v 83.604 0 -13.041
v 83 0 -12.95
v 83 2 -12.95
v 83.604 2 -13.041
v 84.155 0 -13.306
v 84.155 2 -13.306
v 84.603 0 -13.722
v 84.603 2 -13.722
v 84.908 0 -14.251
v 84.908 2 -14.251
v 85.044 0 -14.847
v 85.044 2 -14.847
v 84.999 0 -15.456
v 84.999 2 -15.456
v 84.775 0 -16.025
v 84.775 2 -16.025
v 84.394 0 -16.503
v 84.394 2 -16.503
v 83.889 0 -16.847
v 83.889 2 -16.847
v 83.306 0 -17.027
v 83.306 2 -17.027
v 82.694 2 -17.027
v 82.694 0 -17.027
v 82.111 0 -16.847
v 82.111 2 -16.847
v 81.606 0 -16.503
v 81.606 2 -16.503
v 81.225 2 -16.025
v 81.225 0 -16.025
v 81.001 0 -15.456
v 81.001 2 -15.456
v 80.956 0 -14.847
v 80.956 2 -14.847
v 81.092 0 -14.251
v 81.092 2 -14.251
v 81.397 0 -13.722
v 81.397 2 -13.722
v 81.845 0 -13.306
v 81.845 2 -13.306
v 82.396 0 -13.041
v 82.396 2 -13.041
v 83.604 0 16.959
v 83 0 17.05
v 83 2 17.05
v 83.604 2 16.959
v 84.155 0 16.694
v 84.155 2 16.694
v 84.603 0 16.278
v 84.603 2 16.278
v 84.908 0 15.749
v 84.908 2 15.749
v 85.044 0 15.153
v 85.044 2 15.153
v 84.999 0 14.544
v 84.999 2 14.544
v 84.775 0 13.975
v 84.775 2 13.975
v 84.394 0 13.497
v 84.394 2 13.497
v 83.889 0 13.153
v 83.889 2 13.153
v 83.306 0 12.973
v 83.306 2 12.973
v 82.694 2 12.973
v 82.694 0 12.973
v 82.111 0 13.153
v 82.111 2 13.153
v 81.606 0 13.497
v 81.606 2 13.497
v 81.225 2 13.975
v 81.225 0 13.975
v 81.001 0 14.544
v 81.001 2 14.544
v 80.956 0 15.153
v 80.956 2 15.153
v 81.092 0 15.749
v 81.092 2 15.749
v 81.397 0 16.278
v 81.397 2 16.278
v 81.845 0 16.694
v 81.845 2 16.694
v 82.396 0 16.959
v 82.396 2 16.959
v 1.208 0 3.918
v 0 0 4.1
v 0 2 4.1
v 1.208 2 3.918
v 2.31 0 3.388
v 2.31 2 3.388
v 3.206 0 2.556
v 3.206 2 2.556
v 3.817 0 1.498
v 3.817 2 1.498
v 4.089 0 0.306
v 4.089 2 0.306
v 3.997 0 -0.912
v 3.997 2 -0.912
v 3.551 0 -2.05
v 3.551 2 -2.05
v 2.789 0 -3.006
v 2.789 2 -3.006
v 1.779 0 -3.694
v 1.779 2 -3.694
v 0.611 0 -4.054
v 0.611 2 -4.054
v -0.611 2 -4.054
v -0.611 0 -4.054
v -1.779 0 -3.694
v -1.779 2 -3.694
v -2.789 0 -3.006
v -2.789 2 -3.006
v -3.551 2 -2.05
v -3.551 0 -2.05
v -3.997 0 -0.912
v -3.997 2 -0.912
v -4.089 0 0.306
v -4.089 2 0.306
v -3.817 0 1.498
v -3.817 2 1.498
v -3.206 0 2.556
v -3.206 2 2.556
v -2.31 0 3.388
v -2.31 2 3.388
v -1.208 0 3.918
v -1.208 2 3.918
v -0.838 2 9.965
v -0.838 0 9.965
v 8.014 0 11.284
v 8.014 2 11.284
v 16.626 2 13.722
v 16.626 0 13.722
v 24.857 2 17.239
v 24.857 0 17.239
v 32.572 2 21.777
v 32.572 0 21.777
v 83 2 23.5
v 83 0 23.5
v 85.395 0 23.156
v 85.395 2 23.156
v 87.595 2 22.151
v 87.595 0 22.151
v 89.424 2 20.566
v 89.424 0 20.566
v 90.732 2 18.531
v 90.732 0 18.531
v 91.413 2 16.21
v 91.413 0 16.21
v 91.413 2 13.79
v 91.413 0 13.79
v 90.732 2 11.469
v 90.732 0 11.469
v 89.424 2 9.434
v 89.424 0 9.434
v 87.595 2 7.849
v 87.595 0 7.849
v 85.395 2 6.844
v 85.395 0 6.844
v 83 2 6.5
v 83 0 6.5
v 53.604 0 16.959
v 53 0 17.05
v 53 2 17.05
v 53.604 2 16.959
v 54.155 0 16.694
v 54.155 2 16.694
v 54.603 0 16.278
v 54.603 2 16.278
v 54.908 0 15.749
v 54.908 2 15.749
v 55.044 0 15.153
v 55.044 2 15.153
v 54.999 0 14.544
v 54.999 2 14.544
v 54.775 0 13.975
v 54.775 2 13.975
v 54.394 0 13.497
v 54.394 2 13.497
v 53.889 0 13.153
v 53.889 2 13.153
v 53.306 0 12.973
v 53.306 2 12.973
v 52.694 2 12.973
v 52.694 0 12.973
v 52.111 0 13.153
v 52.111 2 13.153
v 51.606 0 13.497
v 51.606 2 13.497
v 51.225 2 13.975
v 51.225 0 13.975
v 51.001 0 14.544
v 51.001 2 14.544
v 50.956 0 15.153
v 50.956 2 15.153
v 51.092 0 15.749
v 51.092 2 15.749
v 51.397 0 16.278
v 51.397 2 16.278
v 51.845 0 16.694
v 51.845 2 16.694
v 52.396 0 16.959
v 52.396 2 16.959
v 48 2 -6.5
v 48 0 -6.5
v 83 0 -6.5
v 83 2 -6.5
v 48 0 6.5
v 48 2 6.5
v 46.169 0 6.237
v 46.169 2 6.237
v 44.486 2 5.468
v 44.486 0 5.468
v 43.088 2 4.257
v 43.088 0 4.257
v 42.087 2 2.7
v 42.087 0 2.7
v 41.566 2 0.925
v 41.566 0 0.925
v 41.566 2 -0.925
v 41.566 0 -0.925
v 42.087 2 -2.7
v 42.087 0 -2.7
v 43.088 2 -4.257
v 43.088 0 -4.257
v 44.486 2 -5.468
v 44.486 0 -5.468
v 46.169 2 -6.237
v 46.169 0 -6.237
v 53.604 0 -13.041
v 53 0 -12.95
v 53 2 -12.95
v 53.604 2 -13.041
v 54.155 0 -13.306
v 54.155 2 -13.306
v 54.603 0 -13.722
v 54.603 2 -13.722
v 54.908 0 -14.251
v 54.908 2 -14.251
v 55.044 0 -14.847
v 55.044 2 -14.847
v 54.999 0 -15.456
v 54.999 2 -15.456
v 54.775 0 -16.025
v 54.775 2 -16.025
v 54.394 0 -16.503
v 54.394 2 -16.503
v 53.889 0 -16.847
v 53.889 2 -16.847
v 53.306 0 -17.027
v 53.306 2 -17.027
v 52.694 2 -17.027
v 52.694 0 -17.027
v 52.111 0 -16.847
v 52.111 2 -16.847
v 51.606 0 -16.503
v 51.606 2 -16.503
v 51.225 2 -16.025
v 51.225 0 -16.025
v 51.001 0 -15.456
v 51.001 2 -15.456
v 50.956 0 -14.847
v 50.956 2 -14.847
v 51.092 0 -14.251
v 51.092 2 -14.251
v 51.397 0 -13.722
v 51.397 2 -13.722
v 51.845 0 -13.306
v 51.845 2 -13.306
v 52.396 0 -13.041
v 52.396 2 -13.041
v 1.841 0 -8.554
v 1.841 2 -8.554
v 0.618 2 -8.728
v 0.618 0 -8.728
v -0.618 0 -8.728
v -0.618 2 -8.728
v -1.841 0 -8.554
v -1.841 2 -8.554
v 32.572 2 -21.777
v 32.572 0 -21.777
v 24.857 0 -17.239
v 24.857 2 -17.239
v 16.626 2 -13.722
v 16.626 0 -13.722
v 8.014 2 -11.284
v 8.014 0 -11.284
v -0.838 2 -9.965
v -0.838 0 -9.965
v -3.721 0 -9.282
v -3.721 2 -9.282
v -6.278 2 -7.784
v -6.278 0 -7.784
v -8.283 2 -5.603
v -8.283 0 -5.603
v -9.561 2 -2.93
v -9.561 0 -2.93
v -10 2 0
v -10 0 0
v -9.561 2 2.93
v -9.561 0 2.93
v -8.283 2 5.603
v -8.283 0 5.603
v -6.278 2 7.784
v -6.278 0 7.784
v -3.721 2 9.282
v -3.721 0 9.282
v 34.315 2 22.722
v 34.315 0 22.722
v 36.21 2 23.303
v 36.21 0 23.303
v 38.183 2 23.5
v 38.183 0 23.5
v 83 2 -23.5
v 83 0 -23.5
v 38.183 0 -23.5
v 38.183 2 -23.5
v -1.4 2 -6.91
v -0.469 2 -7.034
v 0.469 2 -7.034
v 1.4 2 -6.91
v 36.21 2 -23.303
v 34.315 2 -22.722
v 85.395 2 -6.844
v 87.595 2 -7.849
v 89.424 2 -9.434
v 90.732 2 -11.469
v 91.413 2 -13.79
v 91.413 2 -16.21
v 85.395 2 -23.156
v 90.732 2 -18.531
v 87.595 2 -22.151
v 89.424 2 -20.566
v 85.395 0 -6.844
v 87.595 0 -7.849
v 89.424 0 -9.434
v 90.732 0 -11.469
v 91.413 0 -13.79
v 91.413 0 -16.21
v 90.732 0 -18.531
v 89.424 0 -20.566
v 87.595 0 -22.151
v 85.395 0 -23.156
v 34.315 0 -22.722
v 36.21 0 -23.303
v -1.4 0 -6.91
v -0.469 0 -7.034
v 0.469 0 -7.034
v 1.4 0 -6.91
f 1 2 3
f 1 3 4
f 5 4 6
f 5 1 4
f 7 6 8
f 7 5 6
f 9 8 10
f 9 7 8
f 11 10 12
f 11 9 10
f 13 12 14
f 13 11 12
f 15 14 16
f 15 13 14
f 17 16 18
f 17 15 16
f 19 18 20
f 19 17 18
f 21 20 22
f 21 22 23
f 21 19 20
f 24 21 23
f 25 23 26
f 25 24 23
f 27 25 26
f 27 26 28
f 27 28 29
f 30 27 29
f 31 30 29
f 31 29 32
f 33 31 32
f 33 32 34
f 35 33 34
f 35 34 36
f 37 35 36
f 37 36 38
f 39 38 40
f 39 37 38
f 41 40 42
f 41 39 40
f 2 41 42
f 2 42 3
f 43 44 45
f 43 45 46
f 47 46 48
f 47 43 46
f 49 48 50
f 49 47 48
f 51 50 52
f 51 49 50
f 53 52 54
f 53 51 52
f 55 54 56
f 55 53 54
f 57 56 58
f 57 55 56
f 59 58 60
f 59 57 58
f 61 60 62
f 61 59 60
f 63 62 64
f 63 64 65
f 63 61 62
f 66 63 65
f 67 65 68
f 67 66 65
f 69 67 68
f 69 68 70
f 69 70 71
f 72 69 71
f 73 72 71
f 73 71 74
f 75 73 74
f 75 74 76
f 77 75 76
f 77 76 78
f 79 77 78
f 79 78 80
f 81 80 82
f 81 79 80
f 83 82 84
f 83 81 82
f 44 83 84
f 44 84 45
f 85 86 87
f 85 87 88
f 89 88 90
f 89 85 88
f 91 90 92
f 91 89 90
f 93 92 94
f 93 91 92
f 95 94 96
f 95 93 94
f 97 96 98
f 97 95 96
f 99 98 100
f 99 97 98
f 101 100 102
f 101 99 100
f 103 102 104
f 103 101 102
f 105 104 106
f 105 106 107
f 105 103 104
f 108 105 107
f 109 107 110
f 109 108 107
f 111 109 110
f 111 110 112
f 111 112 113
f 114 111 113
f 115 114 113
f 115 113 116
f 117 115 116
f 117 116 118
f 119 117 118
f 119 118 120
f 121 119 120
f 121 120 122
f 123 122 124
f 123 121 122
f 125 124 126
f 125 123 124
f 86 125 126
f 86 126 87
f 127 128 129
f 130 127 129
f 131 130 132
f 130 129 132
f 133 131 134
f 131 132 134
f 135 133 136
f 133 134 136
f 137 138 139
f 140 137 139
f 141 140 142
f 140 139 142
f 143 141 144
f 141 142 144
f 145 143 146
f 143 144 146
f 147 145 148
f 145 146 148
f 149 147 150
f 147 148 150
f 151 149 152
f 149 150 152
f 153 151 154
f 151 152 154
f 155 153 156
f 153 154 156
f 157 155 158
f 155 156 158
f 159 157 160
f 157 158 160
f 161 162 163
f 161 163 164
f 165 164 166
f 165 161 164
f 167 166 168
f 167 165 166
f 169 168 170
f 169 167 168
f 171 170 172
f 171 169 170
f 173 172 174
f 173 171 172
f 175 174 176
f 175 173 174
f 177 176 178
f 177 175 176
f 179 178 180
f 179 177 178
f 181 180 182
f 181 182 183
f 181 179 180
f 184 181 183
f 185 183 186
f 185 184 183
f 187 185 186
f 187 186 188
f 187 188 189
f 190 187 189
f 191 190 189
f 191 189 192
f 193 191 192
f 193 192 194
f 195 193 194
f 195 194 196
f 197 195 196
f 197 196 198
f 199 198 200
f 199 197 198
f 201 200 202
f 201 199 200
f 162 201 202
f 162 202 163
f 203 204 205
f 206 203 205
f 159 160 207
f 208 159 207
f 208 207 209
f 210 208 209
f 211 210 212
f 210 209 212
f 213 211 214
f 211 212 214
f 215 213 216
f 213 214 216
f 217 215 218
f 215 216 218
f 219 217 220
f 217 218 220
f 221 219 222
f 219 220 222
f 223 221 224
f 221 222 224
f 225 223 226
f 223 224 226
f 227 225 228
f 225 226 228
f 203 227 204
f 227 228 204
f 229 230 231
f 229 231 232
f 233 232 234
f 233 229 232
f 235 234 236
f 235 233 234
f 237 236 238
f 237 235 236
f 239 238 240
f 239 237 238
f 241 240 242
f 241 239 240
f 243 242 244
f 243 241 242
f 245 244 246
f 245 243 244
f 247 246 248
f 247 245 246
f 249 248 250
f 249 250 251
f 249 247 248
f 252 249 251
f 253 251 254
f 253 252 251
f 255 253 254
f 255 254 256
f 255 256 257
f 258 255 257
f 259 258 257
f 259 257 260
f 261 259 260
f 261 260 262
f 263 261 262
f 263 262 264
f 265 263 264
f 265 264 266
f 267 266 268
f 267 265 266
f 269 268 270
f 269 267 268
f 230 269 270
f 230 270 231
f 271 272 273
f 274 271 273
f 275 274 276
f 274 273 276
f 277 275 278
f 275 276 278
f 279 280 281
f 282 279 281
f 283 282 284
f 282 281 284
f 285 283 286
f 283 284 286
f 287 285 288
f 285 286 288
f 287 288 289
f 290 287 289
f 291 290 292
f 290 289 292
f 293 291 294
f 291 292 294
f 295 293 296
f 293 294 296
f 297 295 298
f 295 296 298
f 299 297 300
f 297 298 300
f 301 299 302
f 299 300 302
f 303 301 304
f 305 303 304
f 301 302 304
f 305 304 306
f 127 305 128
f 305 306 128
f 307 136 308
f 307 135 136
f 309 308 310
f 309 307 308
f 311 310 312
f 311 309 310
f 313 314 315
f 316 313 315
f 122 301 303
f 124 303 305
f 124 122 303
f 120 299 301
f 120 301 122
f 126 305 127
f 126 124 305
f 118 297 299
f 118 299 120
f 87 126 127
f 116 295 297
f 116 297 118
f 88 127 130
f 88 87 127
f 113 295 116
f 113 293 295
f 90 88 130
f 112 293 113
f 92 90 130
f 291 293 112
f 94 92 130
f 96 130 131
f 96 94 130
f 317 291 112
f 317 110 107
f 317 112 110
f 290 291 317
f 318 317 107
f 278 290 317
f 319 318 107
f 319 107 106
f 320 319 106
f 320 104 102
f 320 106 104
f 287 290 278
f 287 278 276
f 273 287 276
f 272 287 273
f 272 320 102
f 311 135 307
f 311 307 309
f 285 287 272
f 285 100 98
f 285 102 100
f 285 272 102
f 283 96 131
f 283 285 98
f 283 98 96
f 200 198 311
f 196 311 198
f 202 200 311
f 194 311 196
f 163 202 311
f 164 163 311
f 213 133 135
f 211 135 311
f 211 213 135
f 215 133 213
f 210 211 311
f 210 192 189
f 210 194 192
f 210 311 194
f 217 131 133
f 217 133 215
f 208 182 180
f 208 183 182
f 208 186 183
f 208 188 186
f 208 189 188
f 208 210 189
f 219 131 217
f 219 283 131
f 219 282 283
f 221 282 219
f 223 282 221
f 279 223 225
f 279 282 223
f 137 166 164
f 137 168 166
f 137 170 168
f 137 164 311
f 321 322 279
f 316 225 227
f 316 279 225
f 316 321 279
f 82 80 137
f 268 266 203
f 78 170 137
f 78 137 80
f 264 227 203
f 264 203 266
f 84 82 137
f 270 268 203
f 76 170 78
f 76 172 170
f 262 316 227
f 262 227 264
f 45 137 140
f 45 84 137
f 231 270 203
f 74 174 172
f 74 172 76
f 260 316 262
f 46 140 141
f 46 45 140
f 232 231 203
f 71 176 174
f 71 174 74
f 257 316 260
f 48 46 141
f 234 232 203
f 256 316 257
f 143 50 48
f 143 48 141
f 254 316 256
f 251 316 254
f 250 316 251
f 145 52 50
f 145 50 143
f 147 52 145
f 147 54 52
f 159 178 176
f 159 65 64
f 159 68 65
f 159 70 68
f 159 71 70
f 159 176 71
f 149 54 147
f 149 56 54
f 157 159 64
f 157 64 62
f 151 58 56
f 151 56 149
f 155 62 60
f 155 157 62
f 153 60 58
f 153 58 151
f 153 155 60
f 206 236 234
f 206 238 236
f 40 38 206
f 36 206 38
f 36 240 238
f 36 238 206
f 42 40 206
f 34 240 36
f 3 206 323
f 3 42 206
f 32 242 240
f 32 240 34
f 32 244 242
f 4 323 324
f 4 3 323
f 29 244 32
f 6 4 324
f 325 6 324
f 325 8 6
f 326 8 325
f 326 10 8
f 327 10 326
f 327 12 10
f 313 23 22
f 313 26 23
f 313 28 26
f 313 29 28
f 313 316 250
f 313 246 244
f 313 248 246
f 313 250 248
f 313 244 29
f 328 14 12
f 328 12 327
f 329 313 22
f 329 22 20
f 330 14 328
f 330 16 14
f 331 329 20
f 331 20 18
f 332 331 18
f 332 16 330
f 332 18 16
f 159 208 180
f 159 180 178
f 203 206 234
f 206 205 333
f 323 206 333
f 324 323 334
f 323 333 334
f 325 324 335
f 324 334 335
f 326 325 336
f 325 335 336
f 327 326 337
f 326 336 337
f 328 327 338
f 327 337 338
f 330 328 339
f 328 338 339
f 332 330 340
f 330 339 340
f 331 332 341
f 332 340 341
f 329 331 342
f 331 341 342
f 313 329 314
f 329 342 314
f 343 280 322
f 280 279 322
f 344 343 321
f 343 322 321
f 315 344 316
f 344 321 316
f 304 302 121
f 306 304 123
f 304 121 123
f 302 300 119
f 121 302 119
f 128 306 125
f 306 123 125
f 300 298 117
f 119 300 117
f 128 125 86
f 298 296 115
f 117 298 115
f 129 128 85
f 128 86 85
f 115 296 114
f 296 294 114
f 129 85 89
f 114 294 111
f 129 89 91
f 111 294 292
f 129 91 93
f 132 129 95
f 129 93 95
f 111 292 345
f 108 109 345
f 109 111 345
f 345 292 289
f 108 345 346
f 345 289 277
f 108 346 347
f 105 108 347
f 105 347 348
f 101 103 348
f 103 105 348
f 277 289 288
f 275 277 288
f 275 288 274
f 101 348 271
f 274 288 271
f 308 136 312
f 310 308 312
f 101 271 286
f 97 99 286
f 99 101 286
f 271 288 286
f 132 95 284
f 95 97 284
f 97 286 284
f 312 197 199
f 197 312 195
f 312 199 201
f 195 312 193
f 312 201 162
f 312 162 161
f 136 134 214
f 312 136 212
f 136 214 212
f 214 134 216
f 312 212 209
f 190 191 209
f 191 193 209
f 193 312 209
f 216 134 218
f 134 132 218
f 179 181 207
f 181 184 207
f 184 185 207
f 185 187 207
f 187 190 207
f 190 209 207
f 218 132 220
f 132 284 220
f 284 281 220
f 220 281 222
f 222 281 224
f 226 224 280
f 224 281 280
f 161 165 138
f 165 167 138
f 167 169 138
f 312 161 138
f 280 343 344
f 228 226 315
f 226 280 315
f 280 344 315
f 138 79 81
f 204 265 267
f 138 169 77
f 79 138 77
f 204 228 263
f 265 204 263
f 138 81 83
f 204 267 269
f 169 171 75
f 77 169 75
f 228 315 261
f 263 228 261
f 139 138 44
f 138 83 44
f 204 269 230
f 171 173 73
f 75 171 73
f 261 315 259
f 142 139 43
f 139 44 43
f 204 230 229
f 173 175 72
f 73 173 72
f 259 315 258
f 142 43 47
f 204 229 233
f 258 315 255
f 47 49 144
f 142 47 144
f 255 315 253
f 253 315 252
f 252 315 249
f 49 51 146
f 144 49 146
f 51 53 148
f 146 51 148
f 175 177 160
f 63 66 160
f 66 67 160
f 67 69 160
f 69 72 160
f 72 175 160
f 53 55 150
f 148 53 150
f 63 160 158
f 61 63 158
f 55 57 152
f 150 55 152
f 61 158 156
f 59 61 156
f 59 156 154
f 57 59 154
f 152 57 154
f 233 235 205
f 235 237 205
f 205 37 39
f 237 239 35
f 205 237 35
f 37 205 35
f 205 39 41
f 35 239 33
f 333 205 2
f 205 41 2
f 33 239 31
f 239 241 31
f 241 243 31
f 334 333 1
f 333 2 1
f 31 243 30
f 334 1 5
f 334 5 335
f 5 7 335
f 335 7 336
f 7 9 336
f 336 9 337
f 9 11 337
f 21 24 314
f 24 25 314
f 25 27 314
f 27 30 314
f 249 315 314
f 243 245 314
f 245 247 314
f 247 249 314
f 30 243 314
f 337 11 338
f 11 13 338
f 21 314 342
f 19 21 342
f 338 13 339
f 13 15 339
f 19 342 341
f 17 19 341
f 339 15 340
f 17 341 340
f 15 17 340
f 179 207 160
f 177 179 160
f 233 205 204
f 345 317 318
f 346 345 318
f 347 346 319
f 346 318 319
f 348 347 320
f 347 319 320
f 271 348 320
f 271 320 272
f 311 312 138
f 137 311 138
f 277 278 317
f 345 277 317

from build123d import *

# Parameters (mm, degrees)
SKETCH1_R           = 4.1
SKETCH1_R_2         = 2.05
BOSS_EXTRUDE1_DEPTH = 2
CUT_EXTRUDE1_DEPTH  = 95.490740287
FILLET1_DEPTH       = 2
FILLET2_R           = 10


with BuildPart() as part:
    # Sketch1 → Boss-Extrude1 (new body)
    with BuildSketch(Plane(origin=(0, 0, 0), x_dir=(1, 0, 0), z_dir=(0, 1, 0))):
        with BuildLine():
            Line((35, -10), (35, -23.5))
            Line((35, -23.5), (83, -23.5))
            ThreePointArc((83, -23.5), (91.5, -15), (83, -6.5))
            Line((83, -6.5), (48, -6.5))
            ThreePointArc((48, -6.5), (41.5, 0), (48, 6.5))
            Line((48, 6.5), (83, 6.5))
            ThreePointArc((83, 6.5), (91.5, 15), (83, 23.5))
            Line((83, 23.5), (35, 23.5))
            Line((35, 23.5), (35, 10))
            Line((35, 10), (0, 10))
            ThreePointArc((0, 10), (-10, 0), (0, -10))
            Line((0, -10), (35, -10))
        make_face()
        with Locations(Location((0, 0, 0), (0, 0, 270))):
            Circle(SKETCH1_R, mode=Mode.SUBTRACT)
        with Locations(Location((53, 15, 0), (0, 0, 270))):
            Circle(SKETCH1_R_2, mode=Mode.SUBTRACT)
        with Locations(Location((83, 15, 0), (0, 0, 270))):
            Circle(SKETCH1_R_2, mode=Mode.SUBTRACT)
        with Locations(Location((53, -15, 0), (0, 0, 270))):
            Circle(SKETCH1_R_2, mode=Mode.SUBTRACT)
        with Locations(Location((83, -15, 0), (0, 0, 270))):
            Circle(SKETCH1_R_2, mode=Mode.SUBTRACT)
    extrude(amount=BOSS_EXTRUDE1_DEPTH)

    # Sketch2 → Cut-Extrude1 (cut, through all)
    with BuildSketch(Plane(origin=(0, 2, 0), x_dir=(1, 0, 0), z_dir=(0, 1, 0))):
        with BuildLine():
            Line((-1.840672032, 8.554205192), (-1.4, 6.909594778))
            ThreePointArc((-1.4, 6.909594778), (0, 7.05), (1.4, 6.909594778))
            Line((1.4, 6.909594778), (1.840672032, 8.554205192))
            ThreePointArc((1.840672032, 8.554205192), (0, 8.75), (-1.840672032, 8.554205192))
        make_face()
    extrude(amount=-CUT_EXTRUDE1_DEPTH, mode=Mode.SUBTRACT)

    # Fillet1: read off the stored shape, not the designer's step
    # Fillet1 outline → Fillet1 (add)
    with BuildSketch(Plane(origin=(0, 0, 0), x_dir=(1, 0, 0), z_dir=(0, 1, 0))):
        with BuildLine():
            ThreePointArc((0, -10), (-0.41957616, -9.991193915), (-0.838413356, -9.964791169))
            ThreePointArc((-0.838413356, -9.964791169), (18.024740767, -14.233019392), (35, -23.5))
            Line((35, -23.5), (35, -10))
            Line((35, -10), (0, -10))
        make_face()
        with BuildLine():
            ThreePointArc((35, 23.5), (18.024740767, 14.233019392), (-0.838413356, 9.964791169))
            ThreePointArc((-0.838413356, 9.964791169), (-0.41957616, 9.991193915), (0, 10))
            Line((0, 10), (35, 10))
            Line((35, 10), (35, 23.5))
        make_face()
    extrude(amount=FILLET1_DEPTH)

    # Fillet2
    fillet2_edges = [part.edges().sort_by_distance(p)[0] for p in [
        (35, 1, -23.5),
        (35, 1, 23.5),
    ]]
    fillet(fillet2_edges, radius=FILLET2_R)


solid = part.part
